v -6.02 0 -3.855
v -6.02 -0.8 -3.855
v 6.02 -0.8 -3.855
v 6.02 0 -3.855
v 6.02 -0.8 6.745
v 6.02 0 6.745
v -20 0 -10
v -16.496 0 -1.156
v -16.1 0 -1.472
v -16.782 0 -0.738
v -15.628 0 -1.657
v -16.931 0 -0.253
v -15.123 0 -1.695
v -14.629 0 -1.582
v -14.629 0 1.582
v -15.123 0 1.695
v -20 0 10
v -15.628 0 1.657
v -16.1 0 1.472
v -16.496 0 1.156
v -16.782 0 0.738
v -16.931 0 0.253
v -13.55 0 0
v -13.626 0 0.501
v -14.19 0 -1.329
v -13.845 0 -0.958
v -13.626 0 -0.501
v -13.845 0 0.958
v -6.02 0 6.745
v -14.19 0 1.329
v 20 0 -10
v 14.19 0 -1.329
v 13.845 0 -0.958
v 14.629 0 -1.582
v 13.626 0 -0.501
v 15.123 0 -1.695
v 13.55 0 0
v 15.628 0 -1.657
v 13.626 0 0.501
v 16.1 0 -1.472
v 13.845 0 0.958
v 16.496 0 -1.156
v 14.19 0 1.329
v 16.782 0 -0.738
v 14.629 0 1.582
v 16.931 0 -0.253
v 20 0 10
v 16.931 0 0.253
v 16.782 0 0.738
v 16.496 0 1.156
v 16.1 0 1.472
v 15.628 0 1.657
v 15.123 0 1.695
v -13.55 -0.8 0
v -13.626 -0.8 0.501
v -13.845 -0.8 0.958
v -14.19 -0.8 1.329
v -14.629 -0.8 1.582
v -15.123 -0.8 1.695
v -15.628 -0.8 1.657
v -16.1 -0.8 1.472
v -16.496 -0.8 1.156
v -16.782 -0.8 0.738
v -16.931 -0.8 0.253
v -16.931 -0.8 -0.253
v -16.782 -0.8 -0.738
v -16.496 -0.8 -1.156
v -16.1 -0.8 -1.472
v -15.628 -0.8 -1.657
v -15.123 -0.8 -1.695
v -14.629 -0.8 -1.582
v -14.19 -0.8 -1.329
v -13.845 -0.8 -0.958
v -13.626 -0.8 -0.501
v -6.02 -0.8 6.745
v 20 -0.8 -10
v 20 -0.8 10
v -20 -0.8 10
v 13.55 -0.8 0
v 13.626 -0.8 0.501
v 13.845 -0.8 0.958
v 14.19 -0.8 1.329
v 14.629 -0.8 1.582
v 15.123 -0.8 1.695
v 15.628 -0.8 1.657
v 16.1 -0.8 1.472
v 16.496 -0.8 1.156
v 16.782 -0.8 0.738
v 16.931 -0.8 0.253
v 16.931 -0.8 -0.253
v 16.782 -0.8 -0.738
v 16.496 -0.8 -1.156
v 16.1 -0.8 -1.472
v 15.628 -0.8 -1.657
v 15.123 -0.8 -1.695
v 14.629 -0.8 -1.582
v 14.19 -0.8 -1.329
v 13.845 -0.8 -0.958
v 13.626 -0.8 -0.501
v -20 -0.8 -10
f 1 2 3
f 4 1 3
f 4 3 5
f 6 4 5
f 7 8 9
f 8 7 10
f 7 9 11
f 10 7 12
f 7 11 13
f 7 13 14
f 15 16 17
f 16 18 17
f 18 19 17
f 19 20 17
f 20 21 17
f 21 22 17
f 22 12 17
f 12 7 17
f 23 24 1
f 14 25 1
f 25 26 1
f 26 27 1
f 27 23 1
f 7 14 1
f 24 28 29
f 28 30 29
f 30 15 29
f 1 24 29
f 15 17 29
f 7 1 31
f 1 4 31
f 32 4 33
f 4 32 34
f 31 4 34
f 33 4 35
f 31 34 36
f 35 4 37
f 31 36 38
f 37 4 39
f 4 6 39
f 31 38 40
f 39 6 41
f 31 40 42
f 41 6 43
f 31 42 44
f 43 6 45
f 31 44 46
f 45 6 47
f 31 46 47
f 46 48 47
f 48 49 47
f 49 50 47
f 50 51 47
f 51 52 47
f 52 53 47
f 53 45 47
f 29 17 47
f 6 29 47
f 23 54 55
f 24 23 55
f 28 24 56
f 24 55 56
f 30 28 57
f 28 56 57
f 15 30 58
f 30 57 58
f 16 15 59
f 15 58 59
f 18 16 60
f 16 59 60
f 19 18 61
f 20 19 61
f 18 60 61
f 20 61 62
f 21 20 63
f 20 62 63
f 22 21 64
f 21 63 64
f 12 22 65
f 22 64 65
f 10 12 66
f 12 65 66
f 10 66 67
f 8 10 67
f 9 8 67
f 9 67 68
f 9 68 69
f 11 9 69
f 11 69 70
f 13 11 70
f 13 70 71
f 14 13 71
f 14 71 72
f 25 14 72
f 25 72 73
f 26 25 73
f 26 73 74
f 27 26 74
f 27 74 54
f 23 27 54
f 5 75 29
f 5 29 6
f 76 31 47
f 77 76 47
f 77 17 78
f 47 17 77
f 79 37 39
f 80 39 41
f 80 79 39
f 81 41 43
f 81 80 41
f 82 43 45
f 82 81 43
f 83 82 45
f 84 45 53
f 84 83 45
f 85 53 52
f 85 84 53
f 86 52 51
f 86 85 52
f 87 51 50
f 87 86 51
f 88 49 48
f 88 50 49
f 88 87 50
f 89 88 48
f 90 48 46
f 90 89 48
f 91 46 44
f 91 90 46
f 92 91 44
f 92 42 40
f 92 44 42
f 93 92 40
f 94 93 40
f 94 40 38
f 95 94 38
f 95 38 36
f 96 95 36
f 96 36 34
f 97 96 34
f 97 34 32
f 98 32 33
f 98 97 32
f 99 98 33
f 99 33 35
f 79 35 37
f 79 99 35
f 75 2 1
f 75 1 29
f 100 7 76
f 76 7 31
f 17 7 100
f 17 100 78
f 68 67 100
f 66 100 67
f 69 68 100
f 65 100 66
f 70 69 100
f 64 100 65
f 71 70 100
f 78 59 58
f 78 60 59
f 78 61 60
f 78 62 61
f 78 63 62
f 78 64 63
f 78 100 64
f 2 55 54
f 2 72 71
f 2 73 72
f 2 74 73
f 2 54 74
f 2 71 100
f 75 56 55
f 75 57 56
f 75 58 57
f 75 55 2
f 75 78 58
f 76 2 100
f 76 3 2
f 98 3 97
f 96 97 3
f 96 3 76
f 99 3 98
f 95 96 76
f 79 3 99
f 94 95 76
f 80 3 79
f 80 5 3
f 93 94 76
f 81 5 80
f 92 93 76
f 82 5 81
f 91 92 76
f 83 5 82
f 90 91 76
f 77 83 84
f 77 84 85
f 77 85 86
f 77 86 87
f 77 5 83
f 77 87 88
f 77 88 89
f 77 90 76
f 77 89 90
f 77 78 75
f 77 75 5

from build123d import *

# Parameters (mm, degrees)
SKETCH_W        = 40
SKETCH_H        = 20
PAD_DEPTH       = 0.8
SKETCH001_R     = 1.7
POCKET_DEPTH    = 90.258029
SKETCH002_W     = 12.04
SKETCH002_H     = 10.6
POCKET001_DEPTH = 0.801


with BuildPart() as part:
    # Sketch → Pad (new body)
    with BuildSketch(Plane.XZ):
        Rectangle(SKETCH_W, SKETCH_H)
    extrude(amount=PAD_DEPTH)

    # Sketch001 (on Face6 of Pad) → Pocket (cut, through all)
    with BuildSketch(Plane.XZ.offset(0.8)):
        with Locations((-15.25, 0)):
            Circle(SKETCH001_R)
    pocket = extrude(amount=-POCKET_DEPTH, mode=Mode.SUBTRACT)

    # Mirrored: Pocket across YZ
    add(pocket.mirror(Plane.YZ), mode=Mode.SUBTRACT)

    # Sketch002 (on Face5 of Mirrored) → Pocket001 (cut, through all)
    with BuildSketch(Plane.XZ.offset(0.8)):
        with Locations((0, 1.445)):
            Rectangle(SKETCH002_W, SKETCH002_H)
    extrude(amount=-POCKET001_DEPTH, mode=Mode.SUBTRACT)


solid = part.part
